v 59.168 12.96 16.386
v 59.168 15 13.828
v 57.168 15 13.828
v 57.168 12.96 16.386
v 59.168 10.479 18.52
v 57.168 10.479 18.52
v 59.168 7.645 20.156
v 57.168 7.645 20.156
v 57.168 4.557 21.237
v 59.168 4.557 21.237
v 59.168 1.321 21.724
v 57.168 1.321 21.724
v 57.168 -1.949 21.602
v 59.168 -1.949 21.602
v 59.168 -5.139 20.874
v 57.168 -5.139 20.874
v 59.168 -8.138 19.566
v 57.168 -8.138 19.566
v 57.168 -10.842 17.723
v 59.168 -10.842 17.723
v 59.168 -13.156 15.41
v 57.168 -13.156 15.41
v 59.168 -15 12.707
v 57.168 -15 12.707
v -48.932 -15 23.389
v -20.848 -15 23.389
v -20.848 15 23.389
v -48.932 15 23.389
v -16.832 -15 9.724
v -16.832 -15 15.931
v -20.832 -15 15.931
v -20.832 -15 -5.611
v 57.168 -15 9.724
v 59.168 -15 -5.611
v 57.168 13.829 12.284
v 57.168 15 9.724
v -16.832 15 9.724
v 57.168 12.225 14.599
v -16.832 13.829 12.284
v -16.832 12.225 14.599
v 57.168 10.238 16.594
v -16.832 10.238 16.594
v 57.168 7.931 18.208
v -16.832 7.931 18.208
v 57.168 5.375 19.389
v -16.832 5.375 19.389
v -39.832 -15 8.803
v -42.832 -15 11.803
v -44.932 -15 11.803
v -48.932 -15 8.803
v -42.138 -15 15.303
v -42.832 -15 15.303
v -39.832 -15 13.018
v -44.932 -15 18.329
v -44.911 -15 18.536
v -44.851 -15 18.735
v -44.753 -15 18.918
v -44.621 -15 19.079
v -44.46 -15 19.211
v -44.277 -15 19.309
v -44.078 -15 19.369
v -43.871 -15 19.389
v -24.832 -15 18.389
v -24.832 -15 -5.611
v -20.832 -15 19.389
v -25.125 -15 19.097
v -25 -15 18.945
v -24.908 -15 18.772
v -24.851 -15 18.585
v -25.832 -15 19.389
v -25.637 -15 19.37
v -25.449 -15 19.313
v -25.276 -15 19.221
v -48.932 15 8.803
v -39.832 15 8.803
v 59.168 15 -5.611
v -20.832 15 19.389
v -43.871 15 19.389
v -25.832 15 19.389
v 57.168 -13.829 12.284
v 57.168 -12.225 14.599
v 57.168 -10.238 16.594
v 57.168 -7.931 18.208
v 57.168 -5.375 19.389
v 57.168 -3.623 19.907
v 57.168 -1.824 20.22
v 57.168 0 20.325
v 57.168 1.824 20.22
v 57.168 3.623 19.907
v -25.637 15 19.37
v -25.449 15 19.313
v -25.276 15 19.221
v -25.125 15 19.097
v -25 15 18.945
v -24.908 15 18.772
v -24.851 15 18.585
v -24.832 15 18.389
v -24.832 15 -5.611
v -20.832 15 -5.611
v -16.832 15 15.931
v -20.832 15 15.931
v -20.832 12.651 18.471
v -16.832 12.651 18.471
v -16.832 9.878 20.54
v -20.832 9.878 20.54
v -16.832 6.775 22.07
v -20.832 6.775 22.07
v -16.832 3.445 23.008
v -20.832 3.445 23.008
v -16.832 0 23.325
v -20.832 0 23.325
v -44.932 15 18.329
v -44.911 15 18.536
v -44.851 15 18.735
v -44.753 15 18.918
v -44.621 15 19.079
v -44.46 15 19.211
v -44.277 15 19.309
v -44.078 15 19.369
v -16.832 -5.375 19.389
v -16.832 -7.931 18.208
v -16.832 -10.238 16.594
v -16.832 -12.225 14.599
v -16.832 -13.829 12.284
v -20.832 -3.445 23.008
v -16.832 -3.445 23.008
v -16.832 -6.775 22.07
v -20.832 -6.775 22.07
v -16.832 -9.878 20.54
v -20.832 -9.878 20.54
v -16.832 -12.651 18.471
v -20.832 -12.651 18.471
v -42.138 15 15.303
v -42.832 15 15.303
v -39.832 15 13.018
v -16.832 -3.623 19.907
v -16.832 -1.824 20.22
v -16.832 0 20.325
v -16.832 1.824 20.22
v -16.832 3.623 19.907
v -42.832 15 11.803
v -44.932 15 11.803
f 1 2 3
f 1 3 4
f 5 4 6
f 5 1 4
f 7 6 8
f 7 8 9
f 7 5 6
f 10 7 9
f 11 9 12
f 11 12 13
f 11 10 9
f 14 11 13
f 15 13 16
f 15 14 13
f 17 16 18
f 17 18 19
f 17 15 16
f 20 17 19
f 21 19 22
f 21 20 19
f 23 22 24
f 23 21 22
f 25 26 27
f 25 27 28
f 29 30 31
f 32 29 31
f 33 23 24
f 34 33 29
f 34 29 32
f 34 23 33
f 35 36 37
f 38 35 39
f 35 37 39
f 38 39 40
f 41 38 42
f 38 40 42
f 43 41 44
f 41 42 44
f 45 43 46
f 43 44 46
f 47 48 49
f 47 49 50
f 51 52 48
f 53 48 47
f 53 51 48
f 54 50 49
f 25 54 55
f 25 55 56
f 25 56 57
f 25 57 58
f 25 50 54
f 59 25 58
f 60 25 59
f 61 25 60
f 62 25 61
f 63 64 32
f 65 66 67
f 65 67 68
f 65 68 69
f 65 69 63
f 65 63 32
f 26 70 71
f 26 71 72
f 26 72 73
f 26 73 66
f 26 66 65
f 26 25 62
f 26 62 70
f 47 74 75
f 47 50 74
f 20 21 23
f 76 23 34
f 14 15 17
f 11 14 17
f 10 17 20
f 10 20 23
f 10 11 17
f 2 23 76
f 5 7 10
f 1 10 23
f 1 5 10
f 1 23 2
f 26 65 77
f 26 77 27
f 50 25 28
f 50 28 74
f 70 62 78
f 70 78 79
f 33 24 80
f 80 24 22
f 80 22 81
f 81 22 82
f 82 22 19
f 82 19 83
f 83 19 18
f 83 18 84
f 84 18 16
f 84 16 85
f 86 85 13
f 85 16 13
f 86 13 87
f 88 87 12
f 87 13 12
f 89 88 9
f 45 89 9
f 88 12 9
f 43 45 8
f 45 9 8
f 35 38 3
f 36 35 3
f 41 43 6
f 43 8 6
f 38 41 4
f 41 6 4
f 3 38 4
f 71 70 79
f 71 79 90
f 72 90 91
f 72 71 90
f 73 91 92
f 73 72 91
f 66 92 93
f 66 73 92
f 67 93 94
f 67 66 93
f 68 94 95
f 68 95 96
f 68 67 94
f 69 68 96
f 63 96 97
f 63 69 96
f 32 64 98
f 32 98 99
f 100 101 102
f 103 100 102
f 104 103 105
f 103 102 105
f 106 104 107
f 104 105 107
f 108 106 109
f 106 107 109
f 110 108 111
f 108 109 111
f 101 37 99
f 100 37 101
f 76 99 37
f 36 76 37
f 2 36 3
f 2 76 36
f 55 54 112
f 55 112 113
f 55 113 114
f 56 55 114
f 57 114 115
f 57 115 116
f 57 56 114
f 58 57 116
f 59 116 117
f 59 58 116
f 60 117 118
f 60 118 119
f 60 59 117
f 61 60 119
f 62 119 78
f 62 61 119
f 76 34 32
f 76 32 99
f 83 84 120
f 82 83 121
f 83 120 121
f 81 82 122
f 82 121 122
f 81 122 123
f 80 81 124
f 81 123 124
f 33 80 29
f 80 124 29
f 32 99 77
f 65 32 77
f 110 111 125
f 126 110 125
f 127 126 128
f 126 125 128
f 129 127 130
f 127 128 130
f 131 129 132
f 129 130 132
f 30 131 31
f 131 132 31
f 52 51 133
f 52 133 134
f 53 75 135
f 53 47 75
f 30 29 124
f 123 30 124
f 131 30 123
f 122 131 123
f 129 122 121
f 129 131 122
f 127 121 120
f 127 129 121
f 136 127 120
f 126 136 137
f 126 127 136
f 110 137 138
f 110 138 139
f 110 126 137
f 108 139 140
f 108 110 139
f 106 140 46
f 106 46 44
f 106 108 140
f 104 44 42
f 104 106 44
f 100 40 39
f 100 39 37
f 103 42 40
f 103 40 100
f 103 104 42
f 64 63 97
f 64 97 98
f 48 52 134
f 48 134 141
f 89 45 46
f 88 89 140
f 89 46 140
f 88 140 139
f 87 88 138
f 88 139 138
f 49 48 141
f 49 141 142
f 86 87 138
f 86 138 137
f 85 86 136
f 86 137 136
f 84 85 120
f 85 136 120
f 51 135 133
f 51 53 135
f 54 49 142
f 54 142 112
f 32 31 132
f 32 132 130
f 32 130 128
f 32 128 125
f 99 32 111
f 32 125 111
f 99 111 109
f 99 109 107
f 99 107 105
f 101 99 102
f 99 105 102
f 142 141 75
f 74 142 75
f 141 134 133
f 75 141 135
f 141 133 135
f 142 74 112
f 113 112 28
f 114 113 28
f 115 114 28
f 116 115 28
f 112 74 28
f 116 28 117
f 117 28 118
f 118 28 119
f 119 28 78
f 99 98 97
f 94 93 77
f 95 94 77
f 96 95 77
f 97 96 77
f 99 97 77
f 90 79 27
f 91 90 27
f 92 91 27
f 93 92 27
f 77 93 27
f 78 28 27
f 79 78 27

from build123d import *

# Parameters (mm, degrees)
F1_W     = 4
F1_H     = 20
F2_DEPTH = 15
F3_W     = 30
F3_H     = 15.3343126304
F4_DEPTH = 80
F5_DEPTH = 4
F7_DEPTH = 2


with BuildPart() as f2:
    # F1 (on face) → F2 (new body, symmetric)
    with BuildSketch(Plane.XZ):
        Polygon((-39.8317096115, 13.0181881455), (-42.1376643062, 15.303212098), (-42.8317096115, 15.303212098), (-42.8317096115, 11.803212098), (-42.8317096115, 8.803212098), (-39.8317096115, 8.803212098), align=None)
        Polygon((-42.8317096115, 8.803212098), (-42.8317096115, 11.803212098), (-44.9317096115, 11.803212098), (-48.9317096115, 11.803212098), (-48.9317096115, 8.803212098), align=None)
        with BuildLine():
            Line((-48.9317096115, 11.803212098), (-44.9317096115, 11.803212098))
            Line((-44.9317096115, 11.803212098), (-44.9317096115, 18.3287603771))
            ThreePointArc((-44.9317096115, 18.3287603771), (-44.6210494397, 19.0787603771), (-43.8710494397, 19.3894205489))
            Line((-43.8710494397, 19.3894205489), (-25.8317096115, 19.3894205489))
            ThreePointArc((-25.8317096115, 19.3894205489), (-25.1246028303, 19.0965273301), (-24.8317096115, 18.3894205489))
            Line((-24.8317096115, 18.3894205489), (-24.8317096115, 14.3894205489))
            Line((-24.8317096115, 14.3894205489), (-20.8317096115, 14.3894205489))
            Line((-20.8317096115, 14.3894205489), (-20.8317096115, 19.3894205489))
            Line((-20.8317096115, 19.3894205489), (-20.8479934643, 23.3894205489))
            Line((-20.8479934643, 23.3894205489), (-48.9317096115, 23.3894205489))
            Line((-48.9317096115, 23.3894205489), (-48.9317096115, 11.803212098))
        make_face()
        with Locations((-22.8317096115, 4.3894205489)):
            Rectangle(F1_W, F1_H)
    extrude(amount=F2_DEPTH, both=True)


with BuildPart() as f4:
    # F3 (on face) → F4 (new body)
    with BuildSketch(Plane.YZ.offset(-20.8317096115)):
        with BuildLine():
            ThreePointArc((-5.3753273285, 19.3894205489), (-11.2758533609, 15.6401490131), (-15, 9.7237331793))
            Line((-15, 9.7237331793), (15, 9.7237331793))
            ThreePointArc((15, 9.7237331793), (11.2758533609, 15.6401490131), (5.3753273285, 19.3894205489))
            Line((5.3753273285, 19.3894205489), (-5.3753273285, 19.3894205489))
        make_face()
        with Locations((0, 2.0565768641)):
            Rectangle(F3_W, F3_H)
        with BuildLine():
            ThreePointArc((0, 20.3248104797), (-2.7280532533, 20.0892189982), (-5.3753273285, 19.3894205489))
            Line((-5.3753273285, 19.3894205489), (5.3753273285, 19.3894205489))
            ThreePointArc((5.3753273285, 19.3894205489), (2.7280532533, 20.0892189982), (0, 20.3248104797))
        make_face()
    extrude(amount=F4_DEPTH)

    # F3 (on face) → F5 (join)
    with BuildSketch(Plane.YZ.offset(-20.8317096115)):
        with Locations((0, 2.0565768641)):
            Rectangle(F3_W, F3_H)
        with BuildLine():
            ThreePointArc((0, 20.3248104797), (-9.1839920504, 17.4070372825), (-15, 9.7237331793))
            Line((-15, 9.7237331793), (15, 9.7237331793))
            ThreePointArc((15, 9.7237331793), (9.1839920504, 17.4070372825), (0, 20.3248104797))
        make_face()
        with BuildLine():
            Line((-15, 13.3237317204), (-15, 9.7237331793))
            ThreePointArc((-15, 9.7237331793), (-9.1839920504, 17.4070372825), (0, 20.3248104797))
            ThreePointArc((0, 20.3248104797), (9.1839920504, 17.4070372825), (15, 9.7237331793))
            Line((15, 9.7237331793), (15, 13.3237317204))
            Line((15, 13.3237317204), (15, 15.9312138795))
            ThreePointArc((15, 15.9312138795), (8.3615977942, 21.376006777), (0, 23.3248104797))
            ThreePointArc((0, 23.3248104797), (-8.3615977942, 21.376006777), (-15, 15.9312138795))
            Line((-15, 15.9312138795), (-15, 13.3237317204))
        make_face()
    extrude(amount=F5_DEPTH)

    # F6 (on face) → F7 (join)
    with BuildSketch(Plane.YZ.offset(59.1682903885)):
        with BuildLine():
            Line((15, 9.7237331793), (15, 13.827643136))
            ThreePointArc((15, 13.827643136), (-0.3165064861, 21.7398244617), (-15, 12.7069399559))
            Line((-15, 12.7069399559), (-15, 9.7237331793))
            ThreePointArc((-15, 9.7237331793), (0, 20.3248104797), (15, 9.7237331793))
        make_face()
    extrude(amount=-F7_DEPTH)


solid = Compound([f2.part, f4.part])
